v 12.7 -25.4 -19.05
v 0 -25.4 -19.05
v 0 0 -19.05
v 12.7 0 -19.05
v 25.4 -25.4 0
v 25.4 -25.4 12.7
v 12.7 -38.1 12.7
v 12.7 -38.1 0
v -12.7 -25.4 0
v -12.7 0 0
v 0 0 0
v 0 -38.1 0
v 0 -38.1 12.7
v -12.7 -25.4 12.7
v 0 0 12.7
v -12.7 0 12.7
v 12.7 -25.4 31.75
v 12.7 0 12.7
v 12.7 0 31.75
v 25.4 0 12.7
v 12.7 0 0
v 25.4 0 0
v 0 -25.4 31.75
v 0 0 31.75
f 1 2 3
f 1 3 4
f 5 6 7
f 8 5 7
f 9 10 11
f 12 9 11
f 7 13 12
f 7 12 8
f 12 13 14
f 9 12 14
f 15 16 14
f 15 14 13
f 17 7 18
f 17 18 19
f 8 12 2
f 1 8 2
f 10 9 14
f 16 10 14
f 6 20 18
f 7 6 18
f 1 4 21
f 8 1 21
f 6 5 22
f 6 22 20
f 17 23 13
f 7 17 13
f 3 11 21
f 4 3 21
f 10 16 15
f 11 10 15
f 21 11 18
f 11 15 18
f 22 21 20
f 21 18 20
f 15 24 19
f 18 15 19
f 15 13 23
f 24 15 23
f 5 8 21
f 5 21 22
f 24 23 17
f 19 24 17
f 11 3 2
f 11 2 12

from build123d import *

# Parameters (mm, degrees)
F0_W      = 12.7
F0_H      = 12.7
F1_DEPTH  = 38.1
F0_H_2    = 19.05
F2_DEPTH  = 38.1
F4_DEPTH  = 12.7
F6_DEPTH  = 12.7
F8_DEPTH  = 12.7
F10_DEPTH = 12.7


with BuildPart() as f1:
    # F0 (on Front) → F1 (new body)
    with BuildSketch(Plane.XZ):
        with Locations((-6.35, 6.35)):
            Rectangle(F0_W, F0_H)
    extrude(amount=F1_DEPTH)

    # F0 (on Front) → F2 (join)
    with BuildSketch(Plane.XZ):
        with Locations((6.35, 6.35)):
            Rectangle(F0_W, F0_H)
        with Locations((-6.35, 6.35)):
            Rectangle(F0_W, F0_H)
        with Locations((6.35, -9.525)):
            Rectangle(F0_W, F0_H_2)
        with Locations((19.05, 6.35)):
            Rectangle(F0_W, F0_H)
        with Locations((6.35, 22.225)):
            Rectangle(F0_W, F0_H_2)
    extrude(amount=F2_DEPTH)

    # F3 (on face) → F4 (cut)
    with BuildSketch(Plane.XY.offset(12.7)):
        Polygon((0, -38.1), (-12.7, -25.4), (-12.7, -38.1), align=None)
    extrude(amount=-F4_DEPTH, mode=Mode.SUBTRACT)

    # F5 (on face) → F6 (cut)
    with BuildSketch(Plane.XY.offset(12.7)):
        Polygon((25.4, -25.4), (12.7, -38.1), (25.4, -38.1), align=None)
    extrude(amount=-F6_DEPTH, mode=Mode.SUBTRACT)

    # F7 (on face) → F8 (cut)
    with BuildSketch(Plane(origin=(0, 0, 0), x_dir=(0, -1, 0), z_dir=(-1, 0, 0))):
        Polygon((38.1, 31.75), (25.4, 31.75), (38.1, 12.7), align=None)
    extrude(amount=-F8_DEPTH, mode=Mode.SUBTRACT)

    # F9 (on face) → F10 (cut)
    with BuildSketch(Plane(origin=(0, 0, 0), x_dir=(0, -1, 0), z_dir=(-1, 0, 0))):
        Polygon((38.1, -19.05), (38.1, 0), (25.4, -19.05), align=None)
    extrude(amount=-F10_DEPTH, mode=Mode.SUBTRACT)


solid = f1.part
